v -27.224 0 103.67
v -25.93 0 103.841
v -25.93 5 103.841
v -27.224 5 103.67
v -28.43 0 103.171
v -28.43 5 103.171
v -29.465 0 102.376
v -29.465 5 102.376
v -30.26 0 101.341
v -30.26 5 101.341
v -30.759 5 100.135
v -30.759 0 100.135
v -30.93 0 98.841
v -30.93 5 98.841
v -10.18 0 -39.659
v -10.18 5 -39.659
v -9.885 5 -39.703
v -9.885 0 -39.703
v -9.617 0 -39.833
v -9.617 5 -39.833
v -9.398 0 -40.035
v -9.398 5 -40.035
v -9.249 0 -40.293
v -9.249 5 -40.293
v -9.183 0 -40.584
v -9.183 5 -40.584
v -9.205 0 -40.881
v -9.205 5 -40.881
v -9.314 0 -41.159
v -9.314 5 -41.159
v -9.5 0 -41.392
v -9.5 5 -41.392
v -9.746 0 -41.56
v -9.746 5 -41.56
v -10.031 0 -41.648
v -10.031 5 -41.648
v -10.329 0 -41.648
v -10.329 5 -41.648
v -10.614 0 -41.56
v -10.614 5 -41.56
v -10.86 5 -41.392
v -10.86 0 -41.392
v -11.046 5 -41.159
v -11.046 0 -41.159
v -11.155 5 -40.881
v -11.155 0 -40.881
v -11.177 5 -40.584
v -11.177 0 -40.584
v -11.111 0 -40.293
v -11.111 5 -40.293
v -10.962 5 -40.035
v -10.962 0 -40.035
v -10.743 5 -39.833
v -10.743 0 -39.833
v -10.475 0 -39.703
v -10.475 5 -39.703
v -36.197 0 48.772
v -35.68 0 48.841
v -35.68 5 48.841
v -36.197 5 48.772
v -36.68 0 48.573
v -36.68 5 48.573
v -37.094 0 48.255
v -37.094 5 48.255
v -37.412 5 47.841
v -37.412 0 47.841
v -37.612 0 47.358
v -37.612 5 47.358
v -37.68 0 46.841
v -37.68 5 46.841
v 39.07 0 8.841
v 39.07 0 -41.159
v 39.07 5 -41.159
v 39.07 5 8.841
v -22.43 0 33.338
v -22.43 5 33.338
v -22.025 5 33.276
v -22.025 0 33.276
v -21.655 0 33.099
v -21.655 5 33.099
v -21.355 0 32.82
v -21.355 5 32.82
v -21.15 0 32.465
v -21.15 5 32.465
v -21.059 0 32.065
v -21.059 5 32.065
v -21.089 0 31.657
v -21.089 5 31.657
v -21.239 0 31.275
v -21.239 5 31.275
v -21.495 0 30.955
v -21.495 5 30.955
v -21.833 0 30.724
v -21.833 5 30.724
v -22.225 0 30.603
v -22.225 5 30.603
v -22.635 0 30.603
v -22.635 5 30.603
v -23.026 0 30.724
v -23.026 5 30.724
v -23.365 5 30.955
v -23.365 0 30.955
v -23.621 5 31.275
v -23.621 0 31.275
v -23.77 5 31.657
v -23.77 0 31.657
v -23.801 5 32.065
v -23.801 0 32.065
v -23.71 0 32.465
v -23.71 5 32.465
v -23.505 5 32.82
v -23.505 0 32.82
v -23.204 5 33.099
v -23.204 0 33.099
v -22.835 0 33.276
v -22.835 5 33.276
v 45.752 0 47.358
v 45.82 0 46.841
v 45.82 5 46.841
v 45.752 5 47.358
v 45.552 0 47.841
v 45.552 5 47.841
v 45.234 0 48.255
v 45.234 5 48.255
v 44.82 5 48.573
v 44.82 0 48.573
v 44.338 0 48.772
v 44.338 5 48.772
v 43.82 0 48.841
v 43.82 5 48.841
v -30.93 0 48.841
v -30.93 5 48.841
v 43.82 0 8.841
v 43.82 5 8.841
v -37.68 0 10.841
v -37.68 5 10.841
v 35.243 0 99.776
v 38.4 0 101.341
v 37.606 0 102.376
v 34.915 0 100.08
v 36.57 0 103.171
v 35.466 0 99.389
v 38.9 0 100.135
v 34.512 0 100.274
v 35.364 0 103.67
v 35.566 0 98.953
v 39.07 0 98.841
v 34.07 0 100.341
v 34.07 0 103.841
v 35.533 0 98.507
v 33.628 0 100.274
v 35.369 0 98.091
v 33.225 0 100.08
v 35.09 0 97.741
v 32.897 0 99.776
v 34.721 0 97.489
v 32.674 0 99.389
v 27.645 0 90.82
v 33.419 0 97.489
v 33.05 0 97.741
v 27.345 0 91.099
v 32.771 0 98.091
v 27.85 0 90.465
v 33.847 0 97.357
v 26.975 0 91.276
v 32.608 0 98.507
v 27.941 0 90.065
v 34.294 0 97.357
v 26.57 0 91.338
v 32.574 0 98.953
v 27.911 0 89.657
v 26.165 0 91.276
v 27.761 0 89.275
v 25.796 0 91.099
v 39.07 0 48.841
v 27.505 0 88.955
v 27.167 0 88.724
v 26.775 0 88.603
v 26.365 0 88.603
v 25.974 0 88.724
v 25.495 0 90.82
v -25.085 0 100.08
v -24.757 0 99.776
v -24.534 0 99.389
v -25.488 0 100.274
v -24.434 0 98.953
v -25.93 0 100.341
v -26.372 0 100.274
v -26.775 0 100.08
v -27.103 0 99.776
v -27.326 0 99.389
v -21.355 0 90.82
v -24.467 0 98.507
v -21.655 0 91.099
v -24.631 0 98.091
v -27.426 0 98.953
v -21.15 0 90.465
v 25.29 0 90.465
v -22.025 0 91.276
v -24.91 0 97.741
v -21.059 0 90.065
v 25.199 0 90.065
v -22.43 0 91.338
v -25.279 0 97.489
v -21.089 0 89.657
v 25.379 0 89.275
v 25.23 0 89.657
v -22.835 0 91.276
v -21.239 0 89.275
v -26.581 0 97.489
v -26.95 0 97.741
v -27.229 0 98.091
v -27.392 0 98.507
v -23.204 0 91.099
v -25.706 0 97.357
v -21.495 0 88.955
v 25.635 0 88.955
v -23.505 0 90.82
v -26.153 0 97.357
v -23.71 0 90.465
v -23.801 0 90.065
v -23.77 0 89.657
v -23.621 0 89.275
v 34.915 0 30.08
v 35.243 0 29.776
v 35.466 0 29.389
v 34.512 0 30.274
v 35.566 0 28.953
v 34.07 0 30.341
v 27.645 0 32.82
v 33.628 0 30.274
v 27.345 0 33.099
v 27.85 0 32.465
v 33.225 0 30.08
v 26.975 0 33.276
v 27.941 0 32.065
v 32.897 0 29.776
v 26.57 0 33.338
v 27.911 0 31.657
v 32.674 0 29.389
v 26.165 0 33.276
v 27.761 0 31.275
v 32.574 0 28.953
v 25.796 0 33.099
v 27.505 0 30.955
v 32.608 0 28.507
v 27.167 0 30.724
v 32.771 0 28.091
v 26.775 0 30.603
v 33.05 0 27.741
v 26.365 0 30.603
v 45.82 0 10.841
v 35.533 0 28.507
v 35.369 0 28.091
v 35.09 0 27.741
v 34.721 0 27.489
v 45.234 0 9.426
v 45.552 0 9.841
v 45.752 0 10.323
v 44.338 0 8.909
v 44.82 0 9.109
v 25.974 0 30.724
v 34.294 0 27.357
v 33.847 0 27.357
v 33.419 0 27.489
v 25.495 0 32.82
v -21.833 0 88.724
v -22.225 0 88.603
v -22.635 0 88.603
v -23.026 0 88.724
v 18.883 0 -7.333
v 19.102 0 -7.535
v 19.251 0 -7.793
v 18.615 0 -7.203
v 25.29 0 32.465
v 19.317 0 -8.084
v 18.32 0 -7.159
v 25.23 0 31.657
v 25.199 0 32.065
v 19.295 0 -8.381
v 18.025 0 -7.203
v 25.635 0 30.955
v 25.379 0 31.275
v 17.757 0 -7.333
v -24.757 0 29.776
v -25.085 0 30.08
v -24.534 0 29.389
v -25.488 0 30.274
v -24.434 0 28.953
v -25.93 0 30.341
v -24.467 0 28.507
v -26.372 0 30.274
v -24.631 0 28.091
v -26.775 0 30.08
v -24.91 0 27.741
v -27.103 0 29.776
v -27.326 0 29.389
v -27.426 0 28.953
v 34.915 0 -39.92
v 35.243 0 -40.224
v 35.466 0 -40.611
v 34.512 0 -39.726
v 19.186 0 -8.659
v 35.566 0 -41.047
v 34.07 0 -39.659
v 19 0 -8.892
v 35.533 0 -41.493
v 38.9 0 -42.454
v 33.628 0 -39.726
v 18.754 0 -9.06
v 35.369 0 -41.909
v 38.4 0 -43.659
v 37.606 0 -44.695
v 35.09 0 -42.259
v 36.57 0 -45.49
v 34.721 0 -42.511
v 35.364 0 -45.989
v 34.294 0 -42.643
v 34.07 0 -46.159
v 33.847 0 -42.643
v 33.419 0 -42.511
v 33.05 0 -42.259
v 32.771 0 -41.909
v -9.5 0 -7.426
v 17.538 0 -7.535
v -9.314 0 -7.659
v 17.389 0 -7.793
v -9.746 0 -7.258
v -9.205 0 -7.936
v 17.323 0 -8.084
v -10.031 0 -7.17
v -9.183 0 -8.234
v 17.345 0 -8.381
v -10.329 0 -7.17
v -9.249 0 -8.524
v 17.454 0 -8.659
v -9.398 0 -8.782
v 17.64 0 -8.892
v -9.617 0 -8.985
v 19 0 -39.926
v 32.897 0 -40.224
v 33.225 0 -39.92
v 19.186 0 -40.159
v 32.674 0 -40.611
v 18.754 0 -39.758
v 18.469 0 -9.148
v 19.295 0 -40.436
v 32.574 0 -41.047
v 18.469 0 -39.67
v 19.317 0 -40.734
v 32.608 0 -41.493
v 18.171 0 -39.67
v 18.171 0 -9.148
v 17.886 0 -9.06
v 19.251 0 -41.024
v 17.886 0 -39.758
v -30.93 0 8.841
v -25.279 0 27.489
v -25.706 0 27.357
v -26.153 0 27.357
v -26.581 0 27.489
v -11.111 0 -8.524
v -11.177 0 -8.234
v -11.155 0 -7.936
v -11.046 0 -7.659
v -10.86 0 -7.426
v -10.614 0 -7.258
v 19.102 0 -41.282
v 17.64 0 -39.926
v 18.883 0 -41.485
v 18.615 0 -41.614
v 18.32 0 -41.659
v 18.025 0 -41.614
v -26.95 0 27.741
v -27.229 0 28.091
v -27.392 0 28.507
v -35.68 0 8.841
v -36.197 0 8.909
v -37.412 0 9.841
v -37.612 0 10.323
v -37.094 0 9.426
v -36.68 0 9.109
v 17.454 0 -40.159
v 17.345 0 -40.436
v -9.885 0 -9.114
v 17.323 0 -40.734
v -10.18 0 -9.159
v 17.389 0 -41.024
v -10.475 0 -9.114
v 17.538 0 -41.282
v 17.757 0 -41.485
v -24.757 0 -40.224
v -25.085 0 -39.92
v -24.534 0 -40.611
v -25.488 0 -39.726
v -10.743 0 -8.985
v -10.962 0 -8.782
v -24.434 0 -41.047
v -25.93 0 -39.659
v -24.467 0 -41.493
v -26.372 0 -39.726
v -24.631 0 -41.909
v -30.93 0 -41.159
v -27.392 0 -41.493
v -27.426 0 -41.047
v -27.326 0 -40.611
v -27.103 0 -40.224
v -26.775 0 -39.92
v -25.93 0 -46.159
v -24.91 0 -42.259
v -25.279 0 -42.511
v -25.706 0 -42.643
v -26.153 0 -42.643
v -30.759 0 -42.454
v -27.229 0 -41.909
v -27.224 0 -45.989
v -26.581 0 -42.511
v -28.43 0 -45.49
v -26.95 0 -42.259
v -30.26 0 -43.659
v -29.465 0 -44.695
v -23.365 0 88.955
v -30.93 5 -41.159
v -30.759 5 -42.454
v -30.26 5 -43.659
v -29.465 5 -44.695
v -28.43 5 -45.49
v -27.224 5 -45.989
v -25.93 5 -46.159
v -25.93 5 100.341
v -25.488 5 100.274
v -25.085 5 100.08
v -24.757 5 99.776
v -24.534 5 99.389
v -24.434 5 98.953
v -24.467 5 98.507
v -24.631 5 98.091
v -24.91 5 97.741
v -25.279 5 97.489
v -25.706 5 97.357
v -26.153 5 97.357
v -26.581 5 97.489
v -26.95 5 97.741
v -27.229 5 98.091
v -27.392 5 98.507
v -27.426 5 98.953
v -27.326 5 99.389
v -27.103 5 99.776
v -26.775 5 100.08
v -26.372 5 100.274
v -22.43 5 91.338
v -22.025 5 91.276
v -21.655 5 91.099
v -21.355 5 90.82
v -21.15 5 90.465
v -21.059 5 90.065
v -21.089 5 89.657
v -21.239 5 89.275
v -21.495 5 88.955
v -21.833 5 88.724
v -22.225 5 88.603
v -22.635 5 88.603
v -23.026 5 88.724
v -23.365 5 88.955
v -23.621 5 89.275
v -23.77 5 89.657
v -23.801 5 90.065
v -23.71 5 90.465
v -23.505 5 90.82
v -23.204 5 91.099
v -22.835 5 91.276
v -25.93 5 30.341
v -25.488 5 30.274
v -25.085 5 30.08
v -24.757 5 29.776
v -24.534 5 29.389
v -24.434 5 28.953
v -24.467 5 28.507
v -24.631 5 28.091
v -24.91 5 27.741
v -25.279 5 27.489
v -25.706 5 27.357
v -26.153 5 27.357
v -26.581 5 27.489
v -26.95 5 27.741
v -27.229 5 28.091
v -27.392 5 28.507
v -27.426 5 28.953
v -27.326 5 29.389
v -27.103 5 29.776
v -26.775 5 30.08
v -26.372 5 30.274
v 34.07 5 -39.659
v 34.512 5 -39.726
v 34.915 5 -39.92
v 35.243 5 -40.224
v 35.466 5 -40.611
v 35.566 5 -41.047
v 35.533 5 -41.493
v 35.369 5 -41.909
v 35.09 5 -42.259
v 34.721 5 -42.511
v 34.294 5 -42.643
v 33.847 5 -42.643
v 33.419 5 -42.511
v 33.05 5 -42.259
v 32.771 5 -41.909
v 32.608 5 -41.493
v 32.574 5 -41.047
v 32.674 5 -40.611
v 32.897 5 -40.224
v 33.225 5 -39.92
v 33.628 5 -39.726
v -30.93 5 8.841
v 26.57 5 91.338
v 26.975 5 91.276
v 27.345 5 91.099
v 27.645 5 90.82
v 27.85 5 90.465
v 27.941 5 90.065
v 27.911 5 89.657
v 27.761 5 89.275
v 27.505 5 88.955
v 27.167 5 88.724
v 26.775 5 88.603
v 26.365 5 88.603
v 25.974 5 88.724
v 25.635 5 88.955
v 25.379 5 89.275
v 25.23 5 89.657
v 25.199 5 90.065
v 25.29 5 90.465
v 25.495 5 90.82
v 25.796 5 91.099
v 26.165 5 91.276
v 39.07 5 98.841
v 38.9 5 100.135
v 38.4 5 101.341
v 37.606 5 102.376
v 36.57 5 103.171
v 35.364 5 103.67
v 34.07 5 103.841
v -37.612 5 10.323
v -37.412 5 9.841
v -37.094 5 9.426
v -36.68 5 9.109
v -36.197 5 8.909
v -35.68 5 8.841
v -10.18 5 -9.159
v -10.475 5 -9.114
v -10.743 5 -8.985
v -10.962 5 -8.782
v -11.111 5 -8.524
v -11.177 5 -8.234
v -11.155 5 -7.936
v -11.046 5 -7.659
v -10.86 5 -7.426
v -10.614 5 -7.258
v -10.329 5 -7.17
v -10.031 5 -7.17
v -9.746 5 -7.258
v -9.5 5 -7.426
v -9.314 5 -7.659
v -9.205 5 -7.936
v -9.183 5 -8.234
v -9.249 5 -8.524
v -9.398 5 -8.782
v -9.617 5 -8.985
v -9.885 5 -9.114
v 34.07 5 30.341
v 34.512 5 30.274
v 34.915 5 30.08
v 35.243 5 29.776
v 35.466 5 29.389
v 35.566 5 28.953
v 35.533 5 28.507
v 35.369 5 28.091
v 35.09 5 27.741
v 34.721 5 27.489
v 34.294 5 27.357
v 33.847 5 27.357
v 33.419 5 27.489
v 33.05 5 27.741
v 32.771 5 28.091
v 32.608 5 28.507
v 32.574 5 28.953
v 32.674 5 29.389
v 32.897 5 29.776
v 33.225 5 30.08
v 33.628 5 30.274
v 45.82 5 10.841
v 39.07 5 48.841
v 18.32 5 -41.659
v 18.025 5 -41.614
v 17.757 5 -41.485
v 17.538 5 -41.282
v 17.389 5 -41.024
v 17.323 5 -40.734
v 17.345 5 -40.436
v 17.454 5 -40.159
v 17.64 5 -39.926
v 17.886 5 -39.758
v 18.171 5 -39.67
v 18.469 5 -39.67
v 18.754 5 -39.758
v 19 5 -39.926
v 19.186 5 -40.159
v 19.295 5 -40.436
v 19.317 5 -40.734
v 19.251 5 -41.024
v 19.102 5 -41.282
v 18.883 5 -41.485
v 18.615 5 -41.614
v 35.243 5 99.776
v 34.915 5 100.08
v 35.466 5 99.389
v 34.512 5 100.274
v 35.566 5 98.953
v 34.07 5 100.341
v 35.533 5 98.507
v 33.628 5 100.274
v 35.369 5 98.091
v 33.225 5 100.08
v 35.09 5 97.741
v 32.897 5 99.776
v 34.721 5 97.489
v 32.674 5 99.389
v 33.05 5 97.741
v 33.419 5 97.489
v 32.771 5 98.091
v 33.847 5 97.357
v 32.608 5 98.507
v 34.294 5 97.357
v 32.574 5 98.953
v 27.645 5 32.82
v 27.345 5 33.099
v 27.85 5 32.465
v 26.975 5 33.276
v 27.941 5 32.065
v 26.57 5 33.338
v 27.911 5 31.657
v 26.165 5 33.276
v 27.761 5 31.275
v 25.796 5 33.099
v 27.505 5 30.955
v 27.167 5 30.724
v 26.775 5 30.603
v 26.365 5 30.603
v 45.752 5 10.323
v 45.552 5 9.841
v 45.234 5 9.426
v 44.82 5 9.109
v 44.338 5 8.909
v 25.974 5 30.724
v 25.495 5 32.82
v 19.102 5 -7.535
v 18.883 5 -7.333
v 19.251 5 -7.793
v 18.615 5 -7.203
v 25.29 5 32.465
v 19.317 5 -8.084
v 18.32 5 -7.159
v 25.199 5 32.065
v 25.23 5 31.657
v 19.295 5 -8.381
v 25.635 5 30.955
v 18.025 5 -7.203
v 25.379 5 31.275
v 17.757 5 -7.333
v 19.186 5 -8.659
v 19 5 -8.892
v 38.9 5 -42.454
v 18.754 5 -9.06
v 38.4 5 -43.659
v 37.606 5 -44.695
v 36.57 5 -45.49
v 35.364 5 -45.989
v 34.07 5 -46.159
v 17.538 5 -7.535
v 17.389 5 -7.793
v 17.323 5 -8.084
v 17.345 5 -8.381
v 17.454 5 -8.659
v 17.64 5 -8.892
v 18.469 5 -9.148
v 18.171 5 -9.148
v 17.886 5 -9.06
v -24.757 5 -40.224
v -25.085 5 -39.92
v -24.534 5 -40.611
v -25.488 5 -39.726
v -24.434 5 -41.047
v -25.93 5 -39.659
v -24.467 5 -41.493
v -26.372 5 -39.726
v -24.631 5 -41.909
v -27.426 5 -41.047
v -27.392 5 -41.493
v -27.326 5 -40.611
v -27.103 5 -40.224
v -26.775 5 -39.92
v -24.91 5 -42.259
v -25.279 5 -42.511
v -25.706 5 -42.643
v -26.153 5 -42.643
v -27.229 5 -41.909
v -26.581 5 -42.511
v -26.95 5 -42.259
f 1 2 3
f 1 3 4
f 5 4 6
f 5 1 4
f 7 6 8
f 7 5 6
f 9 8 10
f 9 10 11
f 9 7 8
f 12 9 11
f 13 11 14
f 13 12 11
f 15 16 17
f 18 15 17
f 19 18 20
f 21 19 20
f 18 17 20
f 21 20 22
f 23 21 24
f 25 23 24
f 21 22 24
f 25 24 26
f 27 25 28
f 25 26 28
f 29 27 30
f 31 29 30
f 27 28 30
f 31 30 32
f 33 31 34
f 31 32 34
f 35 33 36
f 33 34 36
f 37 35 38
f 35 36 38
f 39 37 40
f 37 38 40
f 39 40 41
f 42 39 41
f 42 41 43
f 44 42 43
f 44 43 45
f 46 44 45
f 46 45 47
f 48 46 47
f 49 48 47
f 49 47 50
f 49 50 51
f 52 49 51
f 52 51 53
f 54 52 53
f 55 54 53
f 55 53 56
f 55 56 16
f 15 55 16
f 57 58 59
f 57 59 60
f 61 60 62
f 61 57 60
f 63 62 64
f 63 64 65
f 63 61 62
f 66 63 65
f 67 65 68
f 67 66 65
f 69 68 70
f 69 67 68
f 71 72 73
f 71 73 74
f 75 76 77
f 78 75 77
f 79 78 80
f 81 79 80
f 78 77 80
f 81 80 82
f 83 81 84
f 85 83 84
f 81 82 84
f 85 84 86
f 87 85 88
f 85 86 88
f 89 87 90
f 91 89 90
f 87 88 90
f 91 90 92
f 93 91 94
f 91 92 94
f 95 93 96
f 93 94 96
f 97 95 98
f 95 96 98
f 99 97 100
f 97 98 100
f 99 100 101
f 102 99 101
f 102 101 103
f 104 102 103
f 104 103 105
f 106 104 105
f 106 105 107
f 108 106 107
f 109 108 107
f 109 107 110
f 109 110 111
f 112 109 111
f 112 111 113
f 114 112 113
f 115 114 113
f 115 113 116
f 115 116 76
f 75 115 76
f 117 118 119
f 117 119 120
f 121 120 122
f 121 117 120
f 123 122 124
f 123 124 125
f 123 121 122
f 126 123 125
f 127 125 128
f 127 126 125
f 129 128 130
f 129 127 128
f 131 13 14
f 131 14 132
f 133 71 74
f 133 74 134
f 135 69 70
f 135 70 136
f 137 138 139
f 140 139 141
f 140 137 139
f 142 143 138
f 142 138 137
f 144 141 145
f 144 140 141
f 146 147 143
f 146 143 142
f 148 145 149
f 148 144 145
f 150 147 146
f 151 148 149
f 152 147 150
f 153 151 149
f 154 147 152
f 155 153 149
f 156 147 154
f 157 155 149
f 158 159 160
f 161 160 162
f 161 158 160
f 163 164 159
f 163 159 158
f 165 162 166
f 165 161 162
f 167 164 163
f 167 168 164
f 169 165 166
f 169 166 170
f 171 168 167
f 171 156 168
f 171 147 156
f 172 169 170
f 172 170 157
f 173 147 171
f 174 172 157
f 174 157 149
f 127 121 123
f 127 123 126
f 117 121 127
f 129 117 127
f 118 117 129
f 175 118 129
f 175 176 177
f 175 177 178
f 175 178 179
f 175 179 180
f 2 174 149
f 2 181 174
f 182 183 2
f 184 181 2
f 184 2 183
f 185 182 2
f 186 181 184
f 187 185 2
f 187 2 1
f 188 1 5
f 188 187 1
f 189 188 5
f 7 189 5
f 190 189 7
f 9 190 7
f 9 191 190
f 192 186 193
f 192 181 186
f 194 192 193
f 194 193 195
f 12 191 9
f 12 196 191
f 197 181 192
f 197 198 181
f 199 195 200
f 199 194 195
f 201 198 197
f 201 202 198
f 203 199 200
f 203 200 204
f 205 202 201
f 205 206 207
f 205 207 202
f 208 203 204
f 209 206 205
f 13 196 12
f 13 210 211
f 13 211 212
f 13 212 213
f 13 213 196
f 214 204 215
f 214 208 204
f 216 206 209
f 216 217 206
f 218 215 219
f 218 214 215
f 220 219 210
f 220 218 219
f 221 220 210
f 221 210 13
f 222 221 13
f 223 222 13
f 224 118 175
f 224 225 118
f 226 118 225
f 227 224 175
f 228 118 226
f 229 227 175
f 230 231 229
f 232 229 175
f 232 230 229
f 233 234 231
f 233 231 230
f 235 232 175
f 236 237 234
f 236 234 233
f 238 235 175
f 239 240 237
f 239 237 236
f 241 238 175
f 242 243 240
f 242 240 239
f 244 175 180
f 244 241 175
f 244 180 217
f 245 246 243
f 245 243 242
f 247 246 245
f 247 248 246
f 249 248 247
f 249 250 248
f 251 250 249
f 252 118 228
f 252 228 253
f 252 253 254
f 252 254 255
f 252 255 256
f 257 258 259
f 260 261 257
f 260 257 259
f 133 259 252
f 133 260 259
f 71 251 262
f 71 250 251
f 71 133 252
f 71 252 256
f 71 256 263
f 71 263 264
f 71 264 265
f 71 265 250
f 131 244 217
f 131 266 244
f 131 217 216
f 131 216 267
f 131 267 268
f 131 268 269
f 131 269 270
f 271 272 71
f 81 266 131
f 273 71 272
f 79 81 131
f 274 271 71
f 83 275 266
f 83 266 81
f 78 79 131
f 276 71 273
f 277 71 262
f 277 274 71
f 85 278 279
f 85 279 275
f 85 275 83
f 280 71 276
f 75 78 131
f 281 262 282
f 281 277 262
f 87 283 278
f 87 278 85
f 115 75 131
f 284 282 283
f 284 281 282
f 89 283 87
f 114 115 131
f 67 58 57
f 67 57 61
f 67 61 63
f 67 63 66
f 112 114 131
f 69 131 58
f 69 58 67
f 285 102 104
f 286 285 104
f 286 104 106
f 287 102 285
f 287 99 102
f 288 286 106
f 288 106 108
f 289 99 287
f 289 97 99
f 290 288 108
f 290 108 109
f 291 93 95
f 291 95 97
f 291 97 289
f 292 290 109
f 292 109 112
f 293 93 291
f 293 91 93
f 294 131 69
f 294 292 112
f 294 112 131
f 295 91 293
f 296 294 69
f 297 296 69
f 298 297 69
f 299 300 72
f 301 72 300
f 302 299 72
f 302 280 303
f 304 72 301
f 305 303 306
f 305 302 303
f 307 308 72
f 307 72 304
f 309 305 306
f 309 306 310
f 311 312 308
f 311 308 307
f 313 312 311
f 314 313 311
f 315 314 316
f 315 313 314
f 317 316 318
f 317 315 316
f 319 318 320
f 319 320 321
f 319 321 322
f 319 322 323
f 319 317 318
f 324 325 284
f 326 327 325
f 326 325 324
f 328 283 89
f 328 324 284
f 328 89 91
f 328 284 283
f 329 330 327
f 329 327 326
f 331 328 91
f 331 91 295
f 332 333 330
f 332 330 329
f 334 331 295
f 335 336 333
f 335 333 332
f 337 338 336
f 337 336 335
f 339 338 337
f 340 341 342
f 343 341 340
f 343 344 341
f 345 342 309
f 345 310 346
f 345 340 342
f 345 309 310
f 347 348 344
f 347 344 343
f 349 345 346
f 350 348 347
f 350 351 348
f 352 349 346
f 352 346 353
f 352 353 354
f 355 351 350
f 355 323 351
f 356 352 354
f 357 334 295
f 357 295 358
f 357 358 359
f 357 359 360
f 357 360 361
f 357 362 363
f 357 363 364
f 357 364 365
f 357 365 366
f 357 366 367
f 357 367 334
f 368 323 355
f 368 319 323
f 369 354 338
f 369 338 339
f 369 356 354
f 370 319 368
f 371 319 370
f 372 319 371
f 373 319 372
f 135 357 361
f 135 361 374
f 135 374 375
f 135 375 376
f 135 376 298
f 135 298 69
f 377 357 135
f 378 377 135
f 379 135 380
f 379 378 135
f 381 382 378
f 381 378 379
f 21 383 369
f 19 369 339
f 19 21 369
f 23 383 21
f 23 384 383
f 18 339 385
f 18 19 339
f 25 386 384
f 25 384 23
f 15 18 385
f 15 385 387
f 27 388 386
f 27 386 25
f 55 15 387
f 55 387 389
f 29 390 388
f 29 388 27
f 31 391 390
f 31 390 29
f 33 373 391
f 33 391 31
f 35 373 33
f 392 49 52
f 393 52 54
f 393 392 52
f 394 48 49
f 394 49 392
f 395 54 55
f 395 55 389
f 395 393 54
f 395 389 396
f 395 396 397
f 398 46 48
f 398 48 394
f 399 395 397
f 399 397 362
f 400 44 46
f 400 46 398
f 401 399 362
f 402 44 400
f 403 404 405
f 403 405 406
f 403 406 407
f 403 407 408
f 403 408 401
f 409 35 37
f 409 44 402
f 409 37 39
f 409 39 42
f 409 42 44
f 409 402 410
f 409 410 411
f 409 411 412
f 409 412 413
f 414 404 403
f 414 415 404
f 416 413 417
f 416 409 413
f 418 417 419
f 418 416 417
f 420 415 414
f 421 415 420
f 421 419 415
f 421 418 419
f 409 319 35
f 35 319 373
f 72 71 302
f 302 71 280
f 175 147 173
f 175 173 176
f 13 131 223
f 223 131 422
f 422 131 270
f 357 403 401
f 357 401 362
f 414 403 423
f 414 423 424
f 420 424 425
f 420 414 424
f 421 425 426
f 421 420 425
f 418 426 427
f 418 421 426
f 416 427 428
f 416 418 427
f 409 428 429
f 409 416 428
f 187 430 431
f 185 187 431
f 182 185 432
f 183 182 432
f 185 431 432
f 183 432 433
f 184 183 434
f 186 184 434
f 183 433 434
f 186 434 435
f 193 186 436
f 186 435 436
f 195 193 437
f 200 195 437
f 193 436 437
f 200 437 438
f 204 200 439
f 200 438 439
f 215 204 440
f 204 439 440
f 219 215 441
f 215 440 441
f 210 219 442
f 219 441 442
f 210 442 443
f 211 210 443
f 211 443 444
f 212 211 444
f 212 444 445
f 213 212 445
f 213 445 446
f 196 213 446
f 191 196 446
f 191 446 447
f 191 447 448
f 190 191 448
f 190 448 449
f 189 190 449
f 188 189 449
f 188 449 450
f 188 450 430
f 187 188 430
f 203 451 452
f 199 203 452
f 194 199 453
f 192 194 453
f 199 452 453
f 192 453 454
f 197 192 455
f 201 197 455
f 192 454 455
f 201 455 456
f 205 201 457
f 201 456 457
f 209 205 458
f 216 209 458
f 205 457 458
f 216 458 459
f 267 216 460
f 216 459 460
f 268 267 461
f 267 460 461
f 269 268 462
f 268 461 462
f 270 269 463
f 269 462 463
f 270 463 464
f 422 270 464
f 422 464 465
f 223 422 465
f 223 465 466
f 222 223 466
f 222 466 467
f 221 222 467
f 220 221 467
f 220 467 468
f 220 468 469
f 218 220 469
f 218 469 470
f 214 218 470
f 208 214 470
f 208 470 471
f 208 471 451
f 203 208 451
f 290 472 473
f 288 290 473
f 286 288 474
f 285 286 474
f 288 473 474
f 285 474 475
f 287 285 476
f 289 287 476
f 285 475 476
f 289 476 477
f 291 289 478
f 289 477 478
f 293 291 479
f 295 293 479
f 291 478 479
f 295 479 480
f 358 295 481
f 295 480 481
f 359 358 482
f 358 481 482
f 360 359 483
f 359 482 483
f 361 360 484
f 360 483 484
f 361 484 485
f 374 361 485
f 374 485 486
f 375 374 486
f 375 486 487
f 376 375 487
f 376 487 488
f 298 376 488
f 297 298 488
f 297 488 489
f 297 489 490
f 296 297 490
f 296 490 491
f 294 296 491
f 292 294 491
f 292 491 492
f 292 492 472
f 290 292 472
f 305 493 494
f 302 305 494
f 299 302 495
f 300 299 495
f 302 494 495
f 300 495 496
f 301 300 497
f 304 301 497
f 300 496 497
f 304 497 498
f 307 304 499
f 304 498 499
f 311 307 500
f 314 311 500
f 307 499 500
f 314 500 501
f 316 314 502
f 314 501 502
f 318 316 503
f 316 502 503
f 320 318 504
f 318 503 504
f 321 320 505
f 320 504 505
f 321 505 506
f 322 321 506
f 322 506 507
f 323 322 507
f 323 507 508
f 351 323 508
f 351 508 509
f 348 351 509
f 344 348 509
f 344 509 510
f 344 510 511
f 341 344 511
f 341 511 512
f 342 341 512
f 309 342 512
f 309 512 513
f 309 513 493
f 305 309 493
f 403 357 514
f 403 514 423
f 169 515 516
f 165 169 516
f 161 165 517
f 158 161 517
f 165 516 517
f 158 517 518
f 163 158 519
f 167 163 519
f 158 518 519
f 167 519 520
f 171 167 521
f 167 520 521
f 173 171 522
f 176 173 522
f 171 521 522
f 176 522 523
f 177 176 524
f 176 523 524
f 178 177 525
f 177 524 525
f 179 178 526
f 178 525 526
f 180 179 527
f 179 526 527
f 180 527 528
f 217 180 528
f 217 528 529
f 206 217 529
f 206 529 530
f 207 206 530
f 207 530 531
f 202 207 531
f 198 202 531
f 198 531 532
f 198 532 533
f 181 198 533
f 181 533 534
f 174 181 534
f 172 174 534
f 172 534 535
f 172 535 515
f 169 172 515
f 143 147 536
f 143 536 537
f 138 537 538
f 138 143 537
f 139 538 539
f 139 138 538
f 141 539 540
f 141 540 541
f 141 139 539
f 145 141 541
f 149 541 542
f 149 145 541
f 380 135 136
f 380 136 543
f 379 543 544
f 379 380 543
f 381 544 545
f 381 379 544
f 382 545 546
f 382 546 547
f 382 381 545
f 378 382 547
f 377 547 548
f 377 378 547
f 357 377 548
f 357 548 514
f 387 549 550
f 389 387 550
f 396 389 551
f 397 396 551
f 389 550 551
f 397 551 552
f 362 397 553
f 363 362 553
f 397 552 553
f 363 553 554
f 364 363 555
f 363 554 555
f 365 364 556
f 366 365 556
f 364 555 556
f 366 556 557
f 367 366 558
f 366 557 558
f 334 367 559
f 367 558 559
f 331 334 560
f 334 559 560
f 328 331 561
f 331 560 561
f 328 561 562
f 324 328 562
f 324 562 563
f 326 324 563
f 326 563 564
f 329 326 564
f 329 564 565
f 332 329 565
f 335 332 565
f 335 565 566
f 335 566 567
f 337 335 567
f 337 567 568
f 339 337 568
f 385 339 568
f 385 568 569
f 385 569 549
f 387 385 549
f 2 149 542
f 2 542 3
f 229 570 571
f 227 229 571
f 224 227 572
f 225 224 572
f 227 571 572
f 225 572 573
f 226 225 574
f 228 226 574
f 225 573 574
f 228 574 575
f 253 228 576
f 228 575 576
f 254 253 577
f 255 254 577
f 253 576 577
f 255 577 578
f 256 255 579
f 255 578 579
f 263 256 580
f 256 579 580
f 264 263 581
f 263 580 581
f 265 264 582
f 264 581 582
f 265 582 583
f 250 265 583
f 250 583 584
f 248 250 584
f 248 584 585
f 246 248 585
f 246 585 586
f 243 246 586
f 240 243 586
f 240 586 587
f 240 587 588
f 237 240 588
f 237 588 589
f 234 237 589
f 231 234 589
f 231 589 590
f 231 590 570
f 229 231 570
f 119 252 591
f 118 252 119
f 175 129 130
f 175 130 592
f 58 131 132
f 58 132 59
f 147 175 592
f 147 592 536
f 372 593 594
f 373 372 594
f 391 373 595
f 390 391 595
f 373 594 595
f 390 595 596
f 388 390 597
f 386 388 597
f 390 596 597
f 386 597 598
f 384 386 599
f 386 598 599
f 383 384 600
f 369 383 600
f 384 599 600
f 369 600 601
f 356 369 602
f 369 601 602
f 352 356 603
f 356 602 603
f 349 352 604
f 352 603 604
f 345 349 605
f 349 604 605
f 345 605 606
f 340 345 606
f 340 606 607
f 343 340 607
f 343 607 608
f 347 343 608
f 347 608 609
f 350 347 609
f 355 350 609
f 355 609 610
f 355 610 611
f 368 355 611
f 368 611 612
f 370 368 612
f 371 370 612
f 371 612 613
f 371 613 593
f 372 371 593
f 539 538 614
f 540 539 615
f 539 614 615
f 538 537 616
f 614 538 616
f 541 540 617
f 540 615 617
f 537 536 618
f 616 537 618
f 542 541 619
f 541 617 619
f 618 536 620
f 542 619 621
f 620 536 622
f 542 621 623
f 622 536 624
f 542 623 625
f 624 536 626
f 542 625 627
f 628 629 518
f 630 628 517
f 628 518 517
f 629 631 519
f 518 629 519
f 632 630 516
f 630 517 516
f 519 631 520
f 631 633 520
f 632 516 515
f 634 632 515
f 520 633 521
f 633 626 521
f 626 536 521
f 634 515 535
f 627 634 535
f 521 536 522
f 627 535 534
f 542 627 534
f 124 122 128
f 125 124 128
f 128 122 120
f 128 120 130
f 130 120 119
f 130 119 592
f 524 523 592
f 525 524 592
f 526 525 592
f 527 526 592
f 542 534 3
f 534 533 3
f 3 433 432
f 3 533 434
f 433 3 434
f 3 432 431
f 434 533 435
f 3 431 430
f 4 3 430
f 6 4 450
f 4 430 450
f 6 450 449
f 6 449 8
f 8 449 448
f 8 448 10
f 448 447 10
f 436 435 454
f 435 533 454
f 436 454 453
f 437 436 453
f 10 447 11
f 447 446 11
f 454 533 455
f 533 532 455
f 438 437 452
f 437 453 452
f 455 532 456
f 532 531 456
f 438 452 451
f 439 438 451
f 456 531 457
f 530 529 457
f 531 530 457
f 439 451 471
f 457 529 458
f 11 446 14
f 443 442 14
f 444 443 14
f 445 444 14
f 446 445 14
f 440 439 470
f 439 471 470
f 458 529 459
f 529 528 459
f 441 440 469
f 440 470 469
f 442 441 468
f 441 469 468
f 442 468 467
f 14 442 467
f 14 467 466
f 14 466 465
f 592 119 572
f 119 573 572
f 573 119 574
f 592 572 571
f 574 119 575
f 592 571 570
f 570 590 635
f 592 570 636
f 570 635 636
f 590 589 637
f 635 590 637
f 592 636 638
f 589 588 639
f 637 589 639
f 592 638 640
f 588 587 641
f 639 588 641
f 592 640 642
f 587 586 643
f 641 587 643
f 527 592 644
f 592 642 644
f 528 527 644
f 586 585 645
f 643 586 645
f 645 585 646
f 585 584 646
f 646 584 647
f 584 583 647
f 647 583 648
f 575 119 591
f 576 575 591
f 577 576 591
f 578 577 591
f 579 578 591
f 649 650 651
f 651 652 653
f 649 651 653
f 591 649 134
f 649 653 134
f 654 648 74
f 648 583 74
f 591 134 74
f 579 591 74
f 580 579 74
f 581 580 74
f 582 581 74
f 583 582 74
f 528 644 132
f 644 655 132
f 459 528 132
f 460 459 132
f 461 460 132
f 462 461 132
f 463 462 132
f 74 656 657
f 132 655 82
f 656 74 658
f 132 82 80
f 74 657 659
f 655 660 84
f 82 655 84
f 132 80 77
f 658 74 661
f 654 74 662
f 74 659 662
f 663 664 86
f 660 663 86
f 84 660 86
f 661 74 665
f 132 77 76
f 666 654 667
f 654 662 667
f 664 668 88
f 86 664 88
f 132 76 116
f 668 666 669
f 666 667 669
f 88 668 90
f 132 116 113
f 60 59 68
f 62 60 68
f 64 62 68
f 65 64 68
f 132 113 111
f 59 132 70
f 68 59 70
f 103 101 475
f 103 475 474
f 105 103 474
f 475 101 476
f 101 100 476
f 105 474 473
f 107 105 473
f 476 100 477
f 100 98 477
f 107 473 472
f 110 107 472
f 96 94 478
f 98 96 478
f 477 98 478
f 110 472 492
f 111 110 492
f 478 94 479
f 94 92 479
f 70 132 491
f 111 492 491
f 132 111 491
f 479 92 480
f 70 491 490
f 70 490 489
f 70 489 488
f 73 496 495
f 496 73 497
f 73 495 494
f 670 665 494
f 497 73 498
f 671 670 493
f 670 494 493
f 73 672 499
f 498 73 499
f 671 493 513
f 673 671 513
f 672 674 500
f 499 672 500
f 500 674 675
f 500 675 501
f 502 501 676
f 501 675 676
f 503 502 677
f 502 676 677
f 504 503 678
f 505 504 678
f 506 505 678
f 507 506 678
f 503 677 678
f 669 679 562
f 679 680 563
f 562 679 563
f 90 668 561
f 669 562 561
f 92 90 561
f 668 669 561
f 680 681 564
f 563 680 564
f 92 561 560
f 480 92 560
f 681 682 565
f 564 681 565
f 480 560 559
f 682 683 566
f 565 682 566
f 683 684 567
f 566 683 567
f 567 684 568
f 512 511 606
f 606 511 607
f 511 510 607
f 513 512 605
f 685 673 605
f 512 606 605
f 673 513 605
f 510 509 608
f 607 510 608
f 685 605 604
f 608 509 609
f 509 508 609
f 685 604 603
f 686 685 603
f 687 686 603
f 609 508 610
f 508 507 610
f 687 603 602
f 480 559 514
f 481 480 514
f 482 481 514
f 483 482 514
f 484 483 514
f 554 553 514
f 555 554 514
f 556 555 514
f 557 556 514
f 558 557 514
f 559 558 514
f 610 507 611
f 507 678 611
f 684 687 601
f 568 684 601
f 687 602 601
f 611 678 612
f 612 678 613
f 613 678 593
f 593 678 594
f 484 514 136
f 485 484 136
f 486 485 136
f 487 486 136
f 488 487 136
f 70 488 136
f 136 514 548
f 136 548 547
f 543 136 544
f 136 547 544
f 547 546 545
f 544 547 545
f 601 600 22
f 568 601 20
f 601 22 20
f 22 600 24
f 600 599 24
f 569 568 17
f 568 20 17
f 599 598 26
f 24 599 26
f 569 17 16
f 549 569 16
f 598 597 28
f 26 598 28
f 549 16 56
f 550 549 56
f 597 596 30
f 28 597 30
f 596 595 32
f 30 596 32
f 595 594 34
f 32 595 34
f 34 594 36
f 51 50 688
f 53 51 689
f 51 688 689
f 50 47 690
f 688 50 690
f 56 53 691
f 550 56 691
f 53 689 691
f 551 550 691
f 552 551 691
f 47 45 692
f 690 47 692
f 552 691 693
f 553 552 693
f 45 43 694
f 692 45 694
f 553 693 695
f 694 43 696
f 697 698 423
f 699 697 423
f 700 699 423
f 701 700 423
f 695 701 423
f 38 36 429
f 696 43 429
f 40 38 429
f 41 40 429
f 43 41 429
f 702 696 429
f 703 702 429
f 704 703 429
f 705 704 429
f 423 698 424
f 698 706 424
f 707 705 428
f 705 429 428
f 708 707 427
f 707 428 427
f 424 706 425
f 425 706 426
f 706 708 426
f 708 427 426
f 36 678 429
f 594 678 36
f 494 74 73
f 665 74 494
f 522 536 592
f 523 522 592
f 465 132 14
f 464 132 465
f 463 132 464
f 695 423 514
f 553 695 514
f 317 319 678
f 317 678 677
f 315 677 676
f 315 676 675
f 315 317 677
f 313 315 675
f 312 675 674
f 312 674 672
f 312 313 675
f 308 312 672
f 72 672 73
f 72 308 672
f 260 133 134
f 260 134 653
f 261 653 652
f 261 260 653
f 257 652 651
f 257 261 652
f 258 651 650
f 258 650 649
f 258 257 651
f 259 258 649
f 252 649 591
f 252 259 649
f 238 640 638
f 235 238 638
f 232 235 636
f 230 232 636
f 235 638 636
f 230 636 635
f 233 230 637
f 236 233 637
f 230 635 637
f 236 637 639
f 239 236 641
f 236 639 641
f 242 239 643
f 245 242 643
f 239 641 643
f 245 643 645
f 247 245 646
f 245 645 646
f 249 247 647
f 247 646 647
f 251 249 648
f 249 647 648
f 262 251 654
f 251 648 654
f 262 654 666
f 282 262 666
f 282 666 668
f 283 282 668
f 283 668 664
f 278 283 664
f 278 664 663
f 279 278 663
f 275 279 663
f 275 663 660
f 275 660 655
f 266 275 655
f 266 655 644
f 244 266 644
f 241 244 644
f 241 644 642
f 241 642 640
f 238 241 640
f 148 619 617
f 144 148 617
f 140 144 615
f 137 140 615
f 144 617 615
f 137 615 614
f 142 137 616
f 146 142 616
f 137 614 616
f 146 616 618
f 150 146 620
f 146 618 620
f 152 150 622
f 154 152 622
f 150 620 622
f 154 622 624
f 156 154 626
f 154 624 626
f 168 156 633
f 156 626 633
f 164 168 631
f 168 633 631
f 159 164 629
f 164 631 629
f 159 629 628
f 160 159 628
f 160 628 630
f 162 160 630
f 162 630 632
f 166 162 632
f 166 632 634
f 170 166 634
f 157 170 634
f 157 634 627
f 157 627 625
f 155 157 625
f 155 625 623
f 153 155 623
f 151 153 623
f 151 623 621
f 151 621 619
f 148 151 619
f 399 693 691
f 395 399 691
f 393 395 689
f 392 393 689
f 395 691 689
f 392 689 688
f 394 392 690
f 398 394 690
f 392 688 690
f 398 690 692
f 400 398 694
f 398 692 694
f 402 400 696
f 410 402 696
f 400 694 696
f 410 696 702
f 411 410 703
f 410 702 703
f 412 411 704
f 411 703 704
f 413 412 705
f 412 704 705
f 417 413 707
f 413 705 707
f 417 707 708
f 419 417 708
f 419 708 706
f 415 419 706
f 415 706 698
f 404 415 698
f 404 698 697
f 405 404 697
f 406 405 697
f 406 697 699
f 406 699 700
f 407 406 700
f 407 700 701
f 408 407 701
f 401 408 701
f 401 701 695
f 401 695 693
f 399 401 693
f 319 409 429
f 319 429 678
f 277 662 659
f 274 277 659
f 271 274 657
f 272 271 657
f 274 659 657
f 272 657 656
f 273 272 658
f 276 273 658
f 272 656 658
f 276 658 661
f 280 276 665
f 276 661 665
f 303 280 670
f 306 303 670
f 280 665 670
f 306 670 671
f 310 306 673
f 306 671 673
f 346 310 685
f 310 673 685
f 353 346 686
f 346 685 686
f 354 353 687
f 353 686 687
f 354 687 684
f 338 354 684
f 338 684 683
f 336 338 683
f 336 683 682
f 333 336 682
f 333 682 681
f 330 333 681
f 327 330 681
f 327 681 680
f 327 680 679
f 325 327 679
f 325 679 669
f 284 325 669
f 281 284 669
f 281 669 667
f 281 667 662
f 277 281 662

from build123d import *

# Parameters (mm, degrees)
EXTRUDE_1_DEPTH     = 5
SKETCH_3_R          = 1.5
SKETCH_3_R_2        = 1.375
SKETCH_3_R_3        = 1
CUT_EXTRUDE_1_DEPTH = 114.61053585


with BuildPart() as part:
    # 草图1 → 凸台-拉伸1 (new body)
    with BuildSketch(Plane(origin=(0, 0, 0), x_dir=(1, 0, 0), z_dir=(0, 1, 0))):
        with BuildLine():
            Line((-25.929831279, 46.15942029), (34.070168721, 46.15942029))
            ThreePointArc((34.070168721, 46.15942029), (37.605702627, 44.694954196), (39.070168721, 41.15942029))
            Line((39.070168721, 41.15942029), (39.070168721, -8.84057971))
            Line((39.070168721, -8.84057971), (43.820168721, -8.84057971))
            ThreePointArc((43.820168721, -8.84057971), (45.234382283, -9.426366148), (45.820168721, -10.84057971))
            Line((45.820168721, -10.84057971), (45.820168721, -46.84057971))
            ThreePointArc((45.820168721, -46.84057971), (45.234382283, -48.254793273), (43.820168721, -48.84057971))
            Line((43.820168721, -48.84057971), (39.070168721, -48.84057971))
            Line((39.070168721, -48.84057971), (39.070168721, -98.84057971))
            ThreePointArc((39.070168721, -98.84057971), (37.605702627, -102.376113616), (34.070168721, -103.84057971))
            Line((34.070168721, -103.84057971), (-25.929831279, -103.84057971))
            ThreePointArc((-25.929831279, -103.84057971), (-29.465365185, -102.376113616), (-30.929831279, -98.84057971))
            Line((-30.929831279, -98.84057971), (-30.929831279, -48.84057971))
            Line((-30.929831279, -48.84057971), (-35.679831279, -48.84057971))
            ThreePointArc((-35.679831279, -48.84057971), (-37.094044841, -48.254793273), (-37.679831279, -46.84057971))
            Line((-37.679831279, -46.84057971), (-37.679831279, -10.84057971))
            ThreePointArc((-37.679831279, -10.84057971), (-37.094044841, -9.426366148), (-35.679831279, -8.84057971))
            Line((-35.679831279, -8.84057971), (-30.929831279, -8.84057971))
            Line((-30.929831279, -8.84057971), (-30.929831279, 41.15942029))
            ThreePointArc((-30.929831279, 41.15942029), (-29.465365185, 44.694954196), (-25.929831279, 46.15942029))
        make_face()
    extrude(amount=EXTRUDE_1_DEPTH)

    # 草图3 → 切除-拉伸1 (cut, through all)
    with BuildSketch(Plane(origin=(0, 5, 0), x_dir=(1, 0, 0), z_dir=(0, 1, 0))):
        with Locations(Location((34.070168721, 41.15942029, 0), (0, 0, 270))):
            Circle(SKETCH_3_R)
        with Locations(Location((-25.929831279, 41.15942029, 0), (0, 0, 270))):
            Circle(SKETCH_3_R)
        with Locations(Location((-25.929831279, -98.84057971, 0), (0, 0, 270))):
            Circle(SKETCH_3_R)
        with Locations(Location((34.070168721, -98.84057971, 0), (0, 0, 270))):
            Circle(SKETCH_3_R)
        with Locations(Location((34.070168721, -28.84057971, 0), (0, 0, 270))):
            Circle(SKETCH_3_R)
        with Locations(Location((-25.929831279, -28.84057971, 0), (0, 0, 270))):
            Circle(SKETCH_3_R)
        with Locations(Location((26.570168721, -31.962567588, 0), (0, 0, 270))):
            Circle(SKETCH_3_R_2)
        with Locations(Location((-22.429831279, -31.962567588, 0), (0, 0, 270))):
            Circle(SKETCH_3_R_2)
        with Locations(Location((26.570168721, -89.962567588, 0), (0, 0, 270))):
            Circle(SKETCH_3_R_2)
        with Locations(Location((-22.429831279, -89.962567588, 0), (0, 0, 270))):
            Circle(SKETCH_3_R_2)
        with Locations(Location((-10.179831279, 40.658771251, 0), (0, 0, 270))):
            Circle(SKETCH_3_R_3)
        with Locations(Location((18.320168721, 40.658771251, 0), (0, 0, 90))):
            Circle(SKETCH_3_R_3)
        with Locations(Location((-10.179831279, 8.158771251, 0), (0, 0, 90))):
            Circle(SKETCH_3_R_3)
        with Locations(Location((18.320168721, 8.158771251, 0), (0, 0, 270))):
            Circle(SKETCH_3_R_3)
    extrude(amount=-CUT_EXTRUDE_1_DEPTH, mode=Mode.SUBTRACT)


solid = part.part
